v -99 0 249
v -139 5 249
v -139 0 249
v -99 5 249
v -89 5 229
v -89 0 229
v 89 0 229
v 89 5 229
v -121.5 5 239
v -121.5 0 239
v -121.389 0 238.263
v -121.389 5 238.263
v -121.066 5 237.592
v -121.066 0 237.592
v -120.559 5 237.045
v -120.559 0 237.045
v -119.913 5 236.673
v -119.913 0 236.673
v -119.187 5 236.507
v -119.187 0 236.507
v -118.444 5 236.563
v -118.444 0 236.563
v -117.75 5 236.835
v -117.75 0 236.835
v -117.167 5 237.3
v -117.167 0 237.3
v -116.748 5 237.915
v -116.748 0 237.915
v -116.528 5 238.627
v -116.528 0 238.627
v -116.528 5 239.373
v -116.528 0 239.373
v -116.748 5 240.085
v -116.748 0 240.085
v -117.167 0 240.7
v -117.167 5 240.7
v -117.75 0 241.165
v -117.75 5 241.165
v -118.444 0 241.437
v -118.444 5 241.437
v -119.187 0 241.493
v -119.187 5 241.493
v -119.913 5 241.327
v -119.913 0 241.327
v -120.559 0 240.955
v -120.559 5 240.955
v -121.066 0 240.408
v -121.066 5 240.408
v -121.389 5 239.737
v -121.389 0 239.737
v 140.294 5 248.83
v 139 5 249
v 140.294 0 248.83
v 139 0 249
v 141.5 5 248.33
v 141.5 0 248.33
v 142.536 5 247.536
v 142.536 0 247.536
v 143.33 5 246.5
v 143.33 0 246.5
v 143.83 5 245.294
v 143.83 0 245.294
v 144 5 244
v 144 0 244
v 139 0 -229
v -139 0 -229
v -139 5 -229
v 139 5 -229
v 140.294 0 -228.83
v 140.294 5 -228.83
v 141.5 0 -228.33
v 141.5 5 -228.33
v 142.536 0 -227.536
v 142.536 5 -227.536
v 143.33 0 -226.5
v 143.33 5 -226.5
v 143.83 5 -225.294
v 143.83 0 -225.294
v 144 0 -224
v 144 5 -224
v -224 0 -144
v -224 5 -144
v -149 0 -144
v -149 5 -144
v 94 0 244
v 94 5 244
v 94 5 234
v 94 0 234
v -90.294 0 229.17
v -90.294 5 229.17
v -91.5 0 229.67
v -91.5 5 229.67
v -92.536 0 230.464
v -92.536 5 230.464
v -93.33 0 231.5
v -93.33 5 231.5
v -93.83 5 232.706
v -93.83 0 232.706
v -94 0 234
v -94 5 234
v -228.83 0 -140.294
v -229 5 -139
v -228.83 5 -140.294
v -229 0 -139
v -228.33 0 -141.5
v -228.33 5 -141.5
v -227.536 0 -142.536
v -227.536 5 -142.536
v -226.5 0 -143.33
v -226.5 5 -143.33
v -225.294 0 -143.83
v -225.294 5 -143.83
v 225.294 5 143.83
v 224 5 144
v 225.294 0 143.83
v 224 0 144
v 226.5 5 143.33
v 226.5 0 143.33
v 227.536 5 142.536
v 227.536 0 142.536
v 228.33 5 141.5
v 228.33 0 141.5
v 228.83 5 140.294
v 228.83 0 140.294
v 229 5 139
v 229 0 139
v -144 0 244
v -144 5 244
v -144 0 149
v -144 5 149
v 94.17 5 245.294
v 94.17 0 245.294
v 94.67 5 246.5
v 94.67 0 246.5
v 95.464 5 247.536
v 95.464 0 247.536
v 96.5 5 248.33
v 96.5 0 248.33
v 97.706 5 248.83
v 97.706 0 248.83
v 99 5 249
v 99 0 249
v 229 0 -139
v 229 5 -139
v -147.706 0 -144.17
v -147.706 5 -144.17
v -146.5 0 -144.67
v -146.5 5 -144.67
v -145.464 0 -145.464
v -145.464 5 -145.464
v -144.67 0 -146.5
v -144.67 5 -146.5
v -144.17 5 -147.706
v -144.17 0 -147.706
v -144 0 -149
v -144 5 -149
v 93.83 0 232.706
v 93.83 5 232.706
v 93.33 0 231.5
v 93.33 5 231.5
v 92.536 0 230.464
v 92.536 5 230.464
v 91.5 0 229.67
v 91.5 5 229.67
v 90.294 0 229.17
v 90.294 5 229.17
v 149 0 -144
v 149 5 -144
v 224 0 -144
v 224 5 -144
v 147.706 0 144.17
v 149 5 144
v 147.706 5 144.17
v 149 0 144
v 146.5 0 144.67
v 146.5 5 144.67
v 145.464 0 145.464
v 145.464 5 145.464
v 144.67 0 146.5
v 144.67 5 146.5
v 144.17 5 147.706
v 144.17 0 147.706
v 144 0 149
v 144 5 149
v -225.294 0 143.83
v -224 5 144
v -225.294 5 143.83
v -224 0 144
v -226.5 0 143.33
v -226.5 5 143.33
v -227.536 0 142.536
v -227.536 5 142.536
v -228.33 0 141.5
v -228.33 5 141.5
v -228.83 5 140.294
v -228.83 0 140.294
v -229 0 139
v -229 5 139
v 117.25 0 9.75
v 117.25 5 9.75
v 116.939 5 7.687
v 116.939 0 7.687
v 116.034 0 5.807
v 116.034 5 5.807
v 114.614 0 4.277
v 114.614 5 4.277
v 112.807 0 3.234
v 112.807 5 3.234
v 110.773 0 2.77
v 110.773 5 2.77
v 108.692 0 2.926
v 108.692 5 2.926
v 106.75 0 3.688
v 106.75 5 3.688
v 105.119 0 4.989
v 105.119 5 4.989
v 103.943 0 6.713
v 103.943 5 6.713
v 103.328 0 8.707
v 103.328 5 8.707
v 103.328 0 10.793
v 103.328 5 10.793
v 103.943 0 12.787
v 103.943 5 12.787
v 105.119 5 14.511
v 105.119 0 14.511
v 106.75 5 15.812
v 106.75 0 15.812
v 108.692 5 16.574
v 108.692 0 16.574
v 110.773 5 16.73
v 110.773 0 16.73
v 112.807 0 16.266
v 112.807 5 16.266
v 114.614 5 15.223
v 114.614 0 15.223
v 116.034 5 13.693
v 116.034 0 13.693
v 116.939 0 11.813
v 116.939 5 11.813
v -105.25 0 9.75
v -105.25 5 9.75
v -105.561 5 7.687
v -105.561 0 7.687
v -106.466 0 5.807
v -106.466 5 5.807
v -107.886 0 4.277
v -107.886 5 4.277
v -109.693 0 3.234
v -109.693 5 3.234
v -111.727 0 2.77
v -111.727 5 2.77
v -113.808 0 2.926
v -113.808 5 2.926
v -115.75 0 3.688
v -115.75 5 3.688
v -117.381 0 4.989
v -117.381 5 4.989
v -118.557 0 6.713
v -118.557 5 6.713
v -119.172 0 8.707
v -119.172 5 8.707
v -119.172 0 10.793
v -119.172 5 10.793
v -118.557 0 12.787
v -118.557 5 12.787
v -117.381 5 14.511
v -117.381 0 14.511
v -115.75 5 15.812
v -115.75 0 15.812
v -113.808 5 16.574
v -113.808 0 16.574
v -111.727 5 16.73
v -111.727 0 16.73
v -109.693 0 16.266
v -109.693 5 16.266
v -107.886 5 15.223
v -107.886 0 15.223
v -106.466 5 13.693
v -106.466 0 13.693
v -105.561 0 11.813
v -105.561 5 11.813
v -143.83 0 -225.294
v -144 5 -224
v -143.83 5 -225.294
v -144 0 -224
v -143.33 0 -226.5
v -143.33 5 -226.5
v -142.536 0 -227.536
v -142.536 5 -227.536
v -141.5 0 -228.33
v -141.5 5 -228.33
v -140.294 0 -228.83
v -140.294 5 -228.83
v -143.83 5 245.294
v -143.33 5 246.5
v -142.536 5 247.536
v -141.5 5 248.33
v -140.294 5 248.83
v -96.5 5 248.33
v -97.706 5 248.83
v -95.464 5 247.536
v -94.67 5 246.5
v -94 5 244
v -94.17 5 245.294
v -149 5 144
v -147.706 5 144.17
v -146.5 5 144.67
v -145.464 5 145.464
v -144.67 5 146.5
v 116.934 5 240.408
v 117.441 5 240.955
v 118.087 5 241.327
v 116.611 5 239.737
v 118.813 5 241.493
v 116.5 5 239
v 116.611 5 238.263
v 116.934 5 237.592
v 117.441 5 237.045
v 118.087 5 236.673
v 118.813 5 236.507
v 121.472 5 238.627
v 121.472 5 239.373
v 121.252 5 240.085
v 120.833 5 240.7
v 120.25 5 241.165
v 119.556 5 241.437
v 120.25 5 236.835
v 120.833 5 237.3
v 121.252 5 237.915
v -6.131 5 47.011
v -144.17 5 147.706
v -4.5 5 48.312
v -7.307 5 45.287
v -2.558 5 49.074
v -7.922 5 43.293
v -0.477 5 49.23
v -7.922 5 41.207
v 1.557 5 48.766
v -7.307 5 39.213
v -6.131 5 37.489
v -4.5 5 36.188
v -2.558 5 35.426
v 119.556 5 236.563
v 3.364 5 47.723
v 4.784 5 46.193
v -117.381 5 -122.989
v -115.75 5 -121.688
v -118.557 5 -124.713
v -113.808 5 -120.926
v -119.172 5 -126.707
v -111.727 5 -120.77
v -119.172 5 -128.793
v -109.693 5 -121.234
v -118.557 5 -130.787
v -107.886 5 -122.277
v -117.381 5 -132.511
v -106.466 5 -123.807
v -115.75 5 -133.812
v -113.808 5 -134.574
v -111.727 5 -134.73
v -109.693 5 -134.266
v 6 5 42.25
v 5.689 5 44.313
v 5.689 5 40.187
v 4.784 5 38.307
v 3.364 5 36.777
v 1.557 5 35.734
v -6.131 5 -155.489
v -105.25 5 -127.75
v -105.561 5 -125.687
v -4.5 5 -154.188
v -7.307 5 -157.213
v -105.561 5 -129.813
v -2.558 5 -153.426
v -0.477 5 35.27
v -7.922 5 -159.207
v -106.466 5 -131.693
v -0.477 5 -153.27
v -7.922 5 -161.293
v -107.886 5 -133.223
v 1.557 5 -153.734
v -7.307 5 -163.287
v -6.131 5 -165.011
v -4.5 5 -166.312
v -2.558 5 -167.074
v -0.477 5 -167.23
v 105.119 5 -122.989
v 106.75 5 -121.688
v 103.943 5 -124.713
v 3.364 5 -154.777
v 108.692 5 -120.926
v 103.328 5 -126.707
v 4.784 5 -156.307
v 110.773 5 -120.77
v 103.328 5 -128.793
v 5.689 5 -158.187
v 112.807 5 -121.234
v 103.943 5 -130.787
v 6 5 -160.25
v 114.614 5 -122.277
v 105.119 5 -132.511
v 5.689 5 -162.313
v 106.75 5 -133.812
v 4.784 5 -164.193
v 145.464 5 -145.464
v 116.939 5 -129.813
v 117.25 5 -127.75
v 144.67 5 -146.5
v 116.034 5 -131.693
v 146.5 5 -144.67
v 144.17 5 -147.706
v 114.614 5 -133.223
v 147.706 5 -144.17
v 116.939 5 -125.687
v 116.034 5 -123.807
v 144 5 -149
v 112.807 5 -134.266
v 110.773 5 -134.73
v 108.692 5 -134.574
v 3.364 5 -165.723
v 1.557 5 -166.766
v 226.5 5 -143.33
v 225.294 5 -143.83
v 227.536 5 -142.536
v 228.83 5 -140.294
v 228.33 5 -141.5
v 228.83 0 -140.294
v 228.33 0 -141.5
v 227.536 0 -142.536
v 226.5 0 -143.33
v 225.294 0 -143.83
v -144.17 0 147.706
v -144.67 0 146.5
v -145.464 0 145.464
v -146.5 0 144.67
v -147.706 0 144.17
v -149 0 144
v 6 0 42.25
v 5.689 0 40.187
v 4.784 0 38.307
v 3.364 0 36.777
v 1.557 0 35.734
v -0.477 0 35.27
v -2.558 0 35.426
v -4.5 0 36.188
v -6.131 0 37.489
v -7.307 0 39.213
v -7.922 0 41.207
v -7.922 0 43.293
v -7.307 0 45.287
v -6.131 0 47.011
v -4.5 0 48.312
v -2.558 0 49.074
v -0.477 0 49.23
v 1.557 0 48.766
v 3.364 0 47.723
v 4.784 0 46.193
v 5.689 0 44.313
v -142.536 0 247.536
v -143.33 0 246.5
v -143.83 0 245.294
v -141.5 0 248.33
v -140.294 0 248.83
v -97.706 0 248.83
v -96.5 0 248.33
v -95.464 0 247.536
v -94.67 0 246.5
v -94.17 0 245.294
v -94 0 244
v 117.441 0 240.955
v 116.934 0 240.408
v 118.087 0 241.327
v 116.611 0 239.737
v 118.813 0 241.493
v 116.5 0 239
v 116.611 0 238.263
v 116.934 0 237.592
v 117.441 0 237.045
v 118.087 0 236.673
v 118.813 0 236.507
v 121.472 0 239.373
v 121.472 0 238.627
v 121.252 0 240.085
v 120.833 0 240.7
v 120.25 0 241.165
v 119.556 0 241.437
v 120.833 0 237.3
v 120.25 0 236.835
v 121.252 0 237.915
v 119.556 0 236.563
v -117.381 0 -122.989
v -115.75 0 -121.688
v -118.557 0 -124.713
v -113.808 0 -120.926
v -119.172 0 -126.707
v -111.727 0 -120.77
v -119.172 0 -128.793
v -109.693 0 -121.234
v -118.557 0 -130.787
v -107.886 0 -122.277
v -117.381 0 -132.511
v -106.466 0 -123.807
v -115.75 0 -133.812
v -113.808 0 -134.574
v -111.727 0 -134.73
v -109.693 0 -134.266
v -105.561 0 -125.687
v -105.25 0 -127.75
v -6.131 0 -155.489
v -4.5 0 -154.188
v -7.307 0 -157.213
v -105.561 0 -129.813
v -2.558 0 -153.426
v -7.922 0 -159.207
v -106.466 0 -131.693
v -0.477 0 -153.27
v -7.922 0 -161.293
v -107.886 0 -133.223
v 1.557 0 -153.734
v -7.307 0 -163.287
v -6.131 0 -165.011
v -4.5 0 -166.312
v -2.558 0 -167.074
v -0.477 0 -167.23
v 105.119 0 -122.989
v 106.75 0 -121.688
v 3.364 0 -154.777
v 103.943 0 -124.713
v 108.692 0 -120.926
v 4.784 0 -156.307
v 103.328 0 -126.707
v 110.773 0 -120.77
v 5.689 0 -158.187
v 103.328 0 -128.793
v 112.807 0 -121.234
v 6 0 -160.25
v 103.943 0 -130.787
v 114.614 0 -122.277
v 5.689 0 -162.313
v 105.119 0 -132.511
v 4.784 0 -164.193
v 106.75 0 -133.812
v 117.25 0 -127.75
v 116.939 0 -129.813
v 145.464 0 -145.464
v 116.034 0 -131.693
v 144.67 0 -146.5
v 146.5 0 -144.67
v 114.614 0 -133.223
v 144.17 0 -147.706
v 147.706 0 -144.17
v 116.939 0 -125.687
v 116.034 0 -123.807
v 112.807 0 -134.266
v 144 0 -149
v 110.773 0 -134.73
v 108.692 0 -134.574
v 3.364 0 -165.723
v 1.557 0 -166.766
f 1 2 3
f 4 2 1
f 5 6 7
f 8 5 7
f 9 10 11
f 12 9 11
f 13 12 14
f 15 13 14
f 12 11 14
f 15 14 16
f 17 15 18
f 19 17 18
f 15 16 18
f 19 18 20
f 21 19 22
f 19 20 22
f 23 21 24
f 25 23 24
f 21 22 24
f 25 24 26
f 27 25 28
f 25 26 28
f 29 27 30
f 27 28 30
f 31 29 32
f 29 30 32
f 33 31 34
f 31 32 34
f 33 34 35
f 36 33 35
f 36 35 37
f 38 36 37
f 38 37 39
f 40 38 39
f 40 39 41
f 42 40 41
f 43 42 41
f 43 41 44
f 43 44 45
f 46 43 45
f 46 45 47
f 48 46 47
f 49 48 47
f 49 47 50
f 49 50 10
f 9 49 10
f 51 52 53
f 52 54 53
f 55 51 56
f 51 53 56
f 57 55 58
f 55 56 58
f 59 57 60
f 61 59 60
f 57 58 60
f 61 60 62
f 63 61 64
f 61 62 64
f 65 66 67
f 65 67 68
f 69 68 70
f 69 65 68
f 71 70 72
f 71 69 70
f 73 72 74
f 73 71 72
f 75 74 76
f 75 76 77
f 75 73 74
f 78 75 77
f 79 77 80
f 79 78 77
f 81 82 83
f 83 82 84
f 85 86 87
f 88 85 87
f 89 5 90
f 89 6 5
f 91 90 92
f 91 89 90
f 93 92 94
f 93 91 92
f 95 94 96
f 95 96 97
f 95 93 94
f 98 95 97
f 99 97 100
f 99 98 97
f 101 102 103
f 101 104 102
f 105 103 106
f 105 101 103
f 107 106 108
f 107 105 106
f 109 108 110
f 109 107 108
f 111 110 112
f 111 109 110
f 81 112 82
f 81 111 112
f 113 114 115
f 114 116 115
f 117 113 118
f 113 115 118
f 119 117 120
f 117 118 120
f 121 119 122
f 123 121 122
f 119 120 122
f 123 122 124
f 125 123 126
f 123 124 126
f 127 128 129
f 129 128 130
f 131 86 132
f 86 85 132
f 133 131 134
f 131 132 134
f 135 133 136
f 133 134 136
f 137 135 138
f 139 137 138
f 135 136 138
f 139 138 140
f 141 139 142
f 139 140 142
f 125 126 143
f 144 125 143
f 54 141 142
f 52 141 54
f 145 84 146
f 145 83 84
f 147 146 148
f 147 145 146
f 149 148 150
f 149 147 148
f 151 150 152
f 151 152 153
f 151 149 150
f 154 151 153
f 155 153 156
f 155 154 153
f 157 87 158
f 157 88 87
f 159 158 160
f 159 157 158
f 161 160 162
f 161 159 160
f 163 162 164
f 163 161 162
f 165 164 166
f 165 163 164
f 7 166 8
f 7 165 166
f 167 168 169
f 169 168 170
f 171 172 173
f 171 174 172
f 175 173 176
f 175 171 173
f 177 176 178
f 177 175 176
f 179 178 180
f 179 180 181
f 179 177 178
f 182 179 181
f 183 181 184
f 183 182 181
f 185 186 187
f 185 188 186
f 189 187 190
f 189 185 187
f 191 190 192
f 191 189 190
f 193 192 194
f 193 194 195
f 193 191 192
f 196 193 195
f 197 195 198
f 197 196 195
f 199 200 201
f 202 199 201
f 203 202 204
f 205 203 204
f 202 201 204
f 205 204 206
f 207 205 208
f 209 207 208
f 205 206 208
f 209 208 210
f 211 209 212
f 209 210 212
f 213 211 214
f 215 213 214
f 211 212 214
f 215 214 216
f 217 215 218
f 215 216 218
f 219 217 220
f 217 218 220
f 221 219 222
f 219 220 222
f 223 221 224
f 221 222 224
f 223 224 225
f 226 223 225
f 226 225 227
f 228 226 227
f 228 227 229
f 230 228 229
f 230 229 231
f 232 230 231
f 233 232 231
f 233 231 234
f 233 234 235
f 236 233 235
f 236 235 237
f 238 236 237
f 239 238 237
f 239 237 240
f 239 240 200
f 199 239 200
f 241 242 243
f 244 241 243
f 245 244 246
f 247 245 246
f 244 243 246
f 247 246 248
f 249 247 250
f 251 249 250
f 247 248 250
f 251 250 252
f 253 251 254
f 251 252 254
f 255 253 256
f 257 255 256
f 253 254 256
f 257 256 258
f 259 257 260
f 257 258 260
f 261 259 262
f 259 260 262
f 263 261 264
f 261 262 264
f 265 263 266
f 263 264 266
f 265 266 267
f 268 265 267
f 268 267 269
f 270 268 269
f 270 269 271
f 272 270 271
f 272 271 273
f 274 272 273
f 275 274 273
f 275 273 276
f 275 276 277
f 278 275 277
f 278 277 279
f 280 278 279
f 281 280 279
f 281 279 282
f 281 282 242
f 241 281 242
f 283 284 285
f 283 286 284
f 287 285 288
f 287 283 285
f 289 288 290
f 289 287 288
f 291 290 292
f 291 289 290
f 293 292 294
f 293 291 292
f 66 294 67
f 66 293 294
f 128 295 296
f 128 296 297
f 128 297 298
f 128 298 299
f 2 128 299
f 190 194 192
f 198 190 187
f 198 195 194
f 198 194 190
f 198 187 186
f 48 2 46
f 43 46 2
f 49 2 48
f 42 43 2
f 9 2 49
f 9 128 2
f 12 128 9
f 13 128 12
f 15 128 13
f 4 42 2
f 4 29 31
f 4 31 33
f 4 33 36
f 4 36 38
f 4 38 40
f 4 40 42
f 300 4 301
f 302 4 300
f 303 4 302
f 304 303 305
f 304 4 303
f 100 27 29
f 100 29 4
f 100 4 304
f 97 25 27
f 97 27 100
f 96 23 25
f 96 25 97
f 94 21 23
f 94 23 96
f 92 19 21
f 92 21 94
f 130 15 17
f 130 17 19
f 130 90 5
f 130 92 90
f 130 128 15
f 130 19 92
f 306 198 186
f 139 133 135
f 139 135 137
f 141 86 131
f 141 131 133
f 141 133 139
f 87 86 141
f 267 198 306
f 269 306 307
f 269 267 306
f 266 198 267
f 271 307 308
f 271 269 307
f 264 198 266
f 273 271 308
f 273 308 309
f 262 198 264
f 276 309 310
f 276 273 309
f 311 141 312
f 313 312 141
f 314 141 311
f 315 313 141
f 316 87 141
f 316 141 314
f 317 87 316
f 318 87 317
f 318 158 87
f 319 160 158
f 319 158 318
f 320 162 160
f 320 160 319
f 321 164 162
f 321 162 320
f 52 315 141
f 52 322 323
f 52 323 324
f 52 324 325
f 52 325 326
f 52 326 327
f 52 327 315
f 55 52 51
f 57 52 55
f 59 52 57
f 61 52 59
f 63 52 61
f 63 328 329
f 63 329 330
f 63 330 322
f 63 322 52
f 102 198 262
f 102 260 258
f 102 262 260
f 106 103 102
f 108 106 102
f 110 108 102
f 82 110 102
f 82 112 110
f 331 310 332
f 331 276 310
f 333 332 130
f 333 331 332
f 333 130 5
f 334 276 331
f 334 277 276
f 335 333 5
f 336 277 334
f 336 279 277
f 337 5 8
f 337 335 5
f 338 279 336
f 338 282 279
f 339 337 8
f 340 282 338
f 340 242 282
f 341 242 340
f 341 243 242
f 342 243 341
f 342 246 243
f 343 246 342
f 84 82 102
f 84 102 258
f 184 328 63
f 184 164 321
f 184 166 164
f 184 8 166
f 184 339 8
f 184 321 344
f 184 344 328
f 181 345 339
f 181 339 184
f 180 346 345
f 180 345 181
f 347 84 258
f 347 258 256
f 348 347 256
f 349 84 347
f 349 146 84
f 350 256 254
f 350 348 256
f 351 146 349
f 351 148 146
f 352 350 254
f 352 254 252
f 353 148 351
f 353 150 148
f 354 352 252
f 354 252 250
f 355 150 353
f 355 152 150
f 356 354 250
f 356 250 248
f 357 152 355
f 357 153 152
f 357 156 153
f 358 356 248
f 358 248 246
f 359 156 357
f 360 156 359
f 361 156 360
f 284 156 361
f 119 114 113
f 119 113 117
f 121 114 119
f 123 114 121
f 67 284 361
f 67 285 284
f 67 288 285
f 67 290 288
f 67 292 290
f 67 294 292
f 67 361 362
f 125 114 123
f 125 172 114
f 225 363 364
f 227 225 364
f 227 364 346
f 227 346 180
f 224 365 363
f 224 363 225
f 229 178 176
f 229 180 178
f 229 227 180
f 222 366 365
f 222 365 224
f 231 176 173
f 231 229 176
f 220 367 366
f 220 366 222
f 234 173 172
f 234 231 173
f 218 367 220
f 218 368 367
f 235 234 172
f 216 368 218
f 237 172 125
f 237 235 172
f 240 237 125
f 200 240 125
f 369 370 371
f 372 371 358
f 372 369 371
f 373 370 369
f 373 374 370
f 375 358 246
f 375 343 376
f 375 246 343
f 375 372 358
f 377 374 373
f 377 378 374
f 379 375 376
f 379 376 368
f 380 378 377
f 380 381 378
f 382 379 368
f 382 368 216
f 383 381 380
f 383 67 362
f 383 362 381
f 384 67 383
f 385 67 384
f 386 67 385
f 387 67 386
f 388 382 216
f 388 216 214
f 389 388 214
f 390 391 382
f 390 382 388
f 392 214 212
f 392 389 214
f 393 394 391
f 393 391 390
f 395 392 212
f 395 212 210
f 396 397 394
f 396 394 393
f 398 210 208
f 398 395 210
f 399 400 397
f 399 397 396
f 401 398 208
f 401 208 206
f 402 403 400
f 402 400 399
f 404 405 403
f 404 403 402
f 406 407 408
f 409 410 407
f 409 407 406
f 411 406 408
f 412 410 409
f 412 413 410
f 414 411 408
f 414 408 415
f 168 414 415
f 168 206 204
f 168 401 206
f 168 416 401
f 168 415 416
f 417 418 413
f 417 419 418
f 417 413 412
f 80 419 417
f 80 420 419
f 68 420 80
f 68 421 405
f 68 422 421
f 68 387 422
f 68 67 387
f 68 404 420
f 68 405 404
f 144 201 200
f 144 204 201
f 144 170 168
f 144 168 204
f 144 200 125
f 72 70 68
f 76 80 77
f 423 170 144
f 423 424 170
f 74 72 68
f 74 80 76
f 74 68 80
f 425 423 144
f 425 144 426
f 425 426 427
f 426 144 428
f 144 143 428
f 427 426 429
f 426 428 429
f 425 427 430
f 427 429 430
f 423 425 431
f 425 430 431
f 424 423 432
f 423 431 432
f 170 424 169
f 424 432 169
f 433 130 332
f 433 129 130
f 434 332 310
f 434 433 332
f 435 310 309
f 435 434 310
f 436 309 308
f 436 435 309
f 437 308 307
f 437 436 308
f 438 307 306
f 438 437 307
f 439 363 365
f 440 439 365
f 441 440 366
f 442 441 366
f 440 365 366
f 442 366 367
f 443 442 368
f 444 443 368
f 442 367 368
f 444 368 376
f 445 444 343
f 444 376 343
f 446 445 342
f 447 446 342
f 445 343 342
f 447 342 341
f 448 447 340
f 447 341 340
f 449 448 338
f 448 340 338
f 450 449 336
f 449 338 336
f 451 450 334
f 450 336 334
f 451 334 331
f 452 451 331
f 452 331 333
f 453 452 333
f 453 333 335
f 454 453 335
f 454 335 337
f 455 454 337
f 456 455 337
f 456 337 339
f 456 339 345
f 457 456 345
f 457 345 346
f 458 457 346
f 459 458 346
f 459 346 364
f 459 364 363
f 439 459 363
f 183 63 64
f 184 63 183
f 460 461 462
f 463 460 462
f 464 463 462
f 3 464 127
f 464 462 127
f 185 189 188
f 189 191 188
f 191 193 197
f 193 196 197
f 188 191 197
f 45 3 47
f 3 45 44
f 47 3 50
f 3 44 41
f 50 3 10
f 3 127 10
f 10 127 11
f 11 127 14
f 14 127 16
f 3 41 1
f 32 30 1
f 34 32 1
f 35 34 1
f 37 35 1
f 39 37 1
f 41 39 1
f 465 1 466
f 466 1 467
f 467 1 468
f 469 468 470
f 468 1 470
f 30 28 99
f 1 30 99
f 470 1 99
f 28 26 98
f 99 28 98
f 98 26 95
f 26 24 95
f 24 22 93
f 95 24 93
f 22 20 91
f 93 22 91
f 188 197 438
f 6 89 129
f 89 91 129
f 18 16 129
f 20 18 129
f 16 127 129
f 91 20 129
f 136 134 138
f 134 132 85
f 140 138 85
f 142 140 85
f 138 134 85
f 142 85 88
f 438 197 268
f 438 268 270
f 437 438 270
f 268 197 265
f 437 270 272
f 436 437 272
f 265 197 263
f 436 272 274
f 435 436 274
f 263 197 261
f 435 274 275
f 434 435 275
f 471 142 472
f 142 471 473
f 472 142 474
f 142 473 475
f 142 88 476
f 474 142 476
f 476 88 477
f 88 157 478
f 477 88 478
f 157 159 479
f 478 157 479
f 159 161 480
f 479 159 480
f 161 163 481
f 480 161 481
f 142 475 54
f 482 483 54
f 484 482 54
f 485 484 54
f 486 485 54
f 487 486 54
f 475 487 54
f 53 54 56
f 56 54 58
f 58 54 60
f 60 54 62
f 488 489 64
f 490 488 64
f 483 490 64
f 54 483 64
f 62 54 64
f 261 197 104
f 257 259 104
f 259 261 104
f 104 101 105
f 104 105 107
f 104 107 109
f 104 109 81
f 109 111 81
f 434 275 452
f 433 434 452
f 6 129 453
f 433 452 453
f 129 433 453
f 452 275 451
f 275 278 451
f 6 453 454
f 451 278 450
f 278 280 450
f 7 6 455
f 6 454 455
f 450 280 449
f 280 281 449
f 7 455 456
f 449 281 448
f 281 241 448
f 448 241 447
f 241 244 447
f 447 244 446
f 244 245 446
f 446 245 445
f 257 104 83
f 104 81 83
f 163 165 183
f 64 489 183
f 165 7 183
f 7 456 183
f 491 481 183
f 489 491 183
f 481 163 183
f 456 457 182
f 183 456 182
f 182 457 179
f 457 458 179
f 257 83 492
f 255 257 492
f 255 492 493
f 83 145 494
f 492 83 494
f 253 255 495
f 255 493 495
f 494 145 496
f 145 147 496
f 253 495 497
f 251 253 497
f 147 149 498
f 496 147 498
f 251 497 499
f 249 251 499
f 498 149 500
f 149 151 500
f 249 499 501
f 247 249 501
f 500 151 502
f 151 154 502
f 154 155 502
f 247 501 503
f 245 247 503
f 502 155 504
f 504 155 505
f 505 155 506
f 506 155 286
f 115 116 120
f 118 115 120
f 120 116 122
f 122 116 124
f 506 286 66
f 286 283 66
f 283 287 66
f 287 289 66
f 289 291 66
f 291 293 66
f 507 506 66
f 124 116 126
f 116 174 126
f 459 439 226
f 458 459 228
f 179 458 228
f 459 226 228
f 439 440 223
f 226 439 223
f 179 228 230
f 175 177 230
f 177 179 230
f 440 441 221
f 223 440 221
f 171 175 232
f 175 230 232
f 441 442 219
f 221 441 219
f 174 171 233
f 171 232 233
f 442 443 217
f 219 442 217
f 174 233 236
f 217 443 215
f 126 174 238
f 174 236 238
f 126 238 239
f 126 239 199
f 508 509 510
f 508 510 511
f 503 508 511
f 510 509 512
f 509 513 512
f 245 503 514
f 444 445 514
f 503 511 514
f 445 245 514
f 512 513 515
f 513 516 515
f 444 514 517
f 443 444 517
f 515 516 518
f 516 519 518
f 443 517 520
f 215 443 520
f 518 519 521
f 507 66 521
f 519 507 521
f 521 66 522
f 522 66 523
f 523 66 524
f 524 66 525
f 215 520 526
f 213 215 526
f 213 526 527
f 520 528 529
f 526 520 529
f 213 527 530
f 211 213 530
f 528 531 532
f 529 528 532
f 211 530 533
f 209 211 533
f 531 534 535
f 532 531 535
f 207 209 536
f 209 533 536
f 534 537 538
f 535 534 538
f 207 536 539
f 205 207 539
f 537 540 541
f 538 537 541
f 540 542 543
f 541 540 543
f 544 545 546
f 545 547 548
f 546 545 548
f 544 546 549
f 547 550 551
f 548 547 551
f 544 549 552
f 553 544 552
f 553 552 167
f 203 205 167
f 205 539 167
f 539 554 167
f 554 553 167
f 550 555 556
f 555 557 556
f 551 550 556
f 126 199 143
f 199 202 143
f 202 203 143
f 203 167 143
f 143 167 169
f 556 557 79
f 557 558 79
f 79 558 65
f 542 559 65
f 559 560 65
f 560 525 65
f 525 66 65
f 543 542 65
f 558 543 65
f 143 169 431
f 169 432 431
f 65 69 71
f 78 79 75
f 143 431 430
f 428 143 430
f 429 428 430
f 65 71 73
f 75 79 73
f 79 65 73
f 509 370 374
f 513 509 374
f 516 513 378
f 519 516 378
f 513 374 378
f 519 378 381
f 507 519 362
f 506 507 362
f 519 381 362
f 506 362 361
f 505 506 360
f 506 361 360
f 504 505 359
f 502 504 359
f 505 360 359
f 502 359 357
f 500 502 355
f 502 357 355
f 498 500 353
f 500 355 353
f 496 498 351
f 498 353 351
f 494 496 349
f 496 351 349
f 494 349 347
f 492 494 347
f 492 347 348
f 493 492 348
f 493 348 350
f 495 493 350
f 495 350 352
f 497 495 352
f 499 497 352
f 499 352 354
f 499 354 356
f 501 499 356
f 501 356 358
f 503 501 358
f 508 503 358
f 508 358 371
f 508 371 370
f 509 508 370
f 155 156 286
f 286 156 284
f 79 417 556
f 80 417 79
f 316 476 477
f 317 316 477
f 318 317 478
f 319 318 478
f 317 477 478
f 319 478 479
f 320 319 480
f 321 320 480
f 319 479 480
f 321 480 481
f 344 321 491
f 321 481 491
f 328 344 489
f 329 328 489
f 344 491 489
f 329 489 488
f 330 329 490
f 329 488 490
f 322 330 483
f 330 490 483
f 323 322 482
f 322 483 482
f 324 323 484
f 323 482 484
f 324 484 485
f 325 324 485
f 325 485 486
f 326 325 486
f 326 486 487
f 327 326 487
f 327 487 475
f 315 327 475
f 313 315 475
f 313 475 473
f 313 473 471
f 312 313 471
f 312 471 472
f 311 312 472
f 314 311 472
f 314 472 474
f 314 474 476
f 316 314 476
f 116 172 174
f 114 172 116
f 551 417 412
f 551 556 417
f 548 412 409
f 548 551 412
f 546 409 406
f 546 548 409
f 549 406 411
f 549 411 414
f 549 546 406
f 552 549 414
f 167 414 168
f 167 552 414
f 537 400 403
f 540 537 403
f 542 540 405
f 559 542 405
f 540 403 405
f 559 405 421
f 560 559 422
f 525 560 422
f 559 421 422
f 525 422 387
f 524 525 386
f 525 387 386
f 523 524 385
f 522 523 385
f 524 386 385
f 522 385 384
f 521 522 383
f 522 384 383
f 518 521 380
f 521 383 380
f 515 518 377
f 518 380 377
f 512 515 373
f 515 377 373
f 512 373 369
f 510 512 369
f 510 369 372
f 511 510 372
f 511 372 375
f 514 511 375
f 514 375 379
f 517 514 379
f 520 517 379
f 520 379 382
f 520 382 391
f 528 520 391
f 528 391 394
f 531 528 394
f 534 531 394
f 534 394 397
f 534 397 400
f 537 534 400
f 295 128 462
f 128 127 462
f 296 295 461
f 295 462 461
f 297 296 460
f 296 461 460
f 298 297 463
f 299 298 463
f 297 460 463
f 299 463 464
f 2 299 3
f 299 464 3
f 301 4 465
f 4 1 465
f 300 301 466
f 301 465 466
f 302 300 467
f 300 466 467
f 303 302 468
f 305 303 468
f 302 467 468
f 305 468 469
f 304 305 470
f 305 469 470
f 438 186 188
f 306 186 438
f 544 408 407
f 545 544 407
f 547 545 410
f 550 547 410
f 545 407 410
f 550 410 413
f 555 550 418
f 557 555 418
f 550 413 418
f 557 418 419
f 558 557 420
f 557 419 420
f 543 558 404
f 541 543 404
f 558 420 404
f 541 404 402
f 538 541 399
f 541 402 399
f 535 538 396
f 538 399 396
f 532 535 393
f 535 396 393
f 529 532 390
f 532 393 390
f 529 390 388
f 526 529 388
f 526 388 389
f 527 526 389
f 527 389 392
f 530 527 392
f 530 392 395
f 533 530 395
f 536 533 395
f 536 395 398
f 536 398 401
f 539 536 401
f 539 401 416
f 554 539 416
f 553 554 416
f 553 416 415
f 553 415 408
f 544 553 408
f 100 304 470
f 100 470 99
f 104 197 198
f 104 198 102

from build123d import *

# Parameters (mm, degrees)
SKETCH1_W                    = 458
SKETCH1_H                    = 458
BOSS_EXTRUDE1_DEPTH          = 5
SKETCH2_W                    = 85
SKETCH2_H                    = 85
CUT_EXTRUDE1_DEPTH           = 324.893501015
SKETCH4_W                    = 50
SKETCH4_H                    = 20
BOSS_EXTRUDE2_DEPTH          = 5
FILLET1_R                    = 5
FILLET2_R                    = 5
F_5_0_5_DIAMETER_HOLE1_D     = 5
F_5_0_5_DIAMETER_HOLE1_DEPTH = 38
F_5_0_5_DIAMETER_HOLE1_TIP   = 1.502151548
F_14_0_14_DIAMETER_HOLE1_D   = 14


with BuildPart() as part:
    # Sketch1 → Boss-Extrude1 (new body)
    with BuildSketch(Plane(origin=(0, 0, 0), x_dir=(1, 0, 0), z_dir=(0, 1, 0))):
        Rectangle(SKETCH1_W, SKETCH1_H)
    extrude(amount=BOSS_EXTRUDE1_DEPTH)

    # Sketch2 → Cut-Extrude1 (cut, through all)
    with BuildSketch(Plane(origin=(0, 5, 0), x_dir=(1, 0, 0), z_dir=(0, 1, 0))):
        with Locations((-186.5, 186.5)):
            Rectangle(SKETCH2_W, SKETCH2_H)
        with Locations((186.5, 186.5)):
            Rectangle(SKETCH2_W, SKETCH2_H)
        with Locations((186.5, -186.5)):
            Rectangle(SKETCH2_W, SKETCH2_H)
        with Locations((-186.5, -186.5)):
            Rectangle(SKETCH2_W, SKETCH2_H)
    extrude(amount=-CUT_EXTRUDE1_DEPTH, mode=Mode.SUBTRACT)

    # Sketch4 → Boss-Extrude2 (add)
    with BuildSketch(Plane(origin=(0, 5, 0), x_dir=(1, 0, 0), z_dir=(0, 1, 0))):
        with Locations((-119, -239)):
            Rectangle(SKETCH4_W, SKETCH4_H)
        with Locations((119, -239)):
            Rectangle(SKETCH4_W, SKETCH4_H)
    extrude(amount=-BOSS_EXTRUDE2_DEPTH)

    # Fillet1
    fillet1_edges = [part.edges().sort_by_distance(p)[0] for p in [
        (-144, 2.5, 144),
        (144, 2.5, 144),
        (144, 2.5, -144),
        (-144, 2.5, -144),
        (-94, 2.5, 229),
        (94, 2.5, 229),
    ]]
    fillet(fillet1_edges, radius=FILLET1_R)

    # Fillet2
    fillet2_edges = [part.edges().sort_by_distance(p)[0] for p in [
        (-229, 2.5, 144),
        (229, 2.5, 144),
        (229, 2.5, -144),
        (144, 2.5, -229),
        (-229, 2.5, -144),
        (-144, 2.5, -229),
        (-144, 2.5, 249),
        (-94, 2.5, 249),
        (144, 2.5, 249),
        (94, 2.5, 249),
    ]]
    fillet(fillet2_edges, radius=FILLET2_R)

    # Ø5.0 (5) Diameter Hole1
    with Locations(Plane(origin=(0, 5, 0), x_dir=(1, 0, 0), z_dir=(0, 1, 0))):
        with Locations((-119, -239), (119, -239)):
            Hole(F_5_0_5_DIAMETER_HOLE1_D / 2, depth=F_5_0_5_DIAMETER_HOLE1_DEPTH)
            with Locations((0, 0, -(F_5_0_5_DIAMETER_HOLE1_DEPTH + F_5_0_5_DIAMETER_HOLE1_TIP / 2))):  # 118° drill point
                Cone(0, F_5_0_5_DIAMETER_HOLE1_D / 2, F_5_0_5_DIAMETER_HOLE1_TIP, mode=Mode.SUBTRACT)

    # Ø14.0 (14) Diameter Hole1 (through all)
    with Locations(Plane(origin=(0, 0, 0), x_dir=(-1, 0, 0), z_dir=(0, -1, 0))):
        with Locations((112.25, 127.75), (112.25, -9.75), (1, 160.25), (-110.25, 127.75), (-110.25, -9.75), (1, -42.25)):
            Hole(F_14_0_14_DIAMETER_HOLE1_D / 2)


solid = part.part
